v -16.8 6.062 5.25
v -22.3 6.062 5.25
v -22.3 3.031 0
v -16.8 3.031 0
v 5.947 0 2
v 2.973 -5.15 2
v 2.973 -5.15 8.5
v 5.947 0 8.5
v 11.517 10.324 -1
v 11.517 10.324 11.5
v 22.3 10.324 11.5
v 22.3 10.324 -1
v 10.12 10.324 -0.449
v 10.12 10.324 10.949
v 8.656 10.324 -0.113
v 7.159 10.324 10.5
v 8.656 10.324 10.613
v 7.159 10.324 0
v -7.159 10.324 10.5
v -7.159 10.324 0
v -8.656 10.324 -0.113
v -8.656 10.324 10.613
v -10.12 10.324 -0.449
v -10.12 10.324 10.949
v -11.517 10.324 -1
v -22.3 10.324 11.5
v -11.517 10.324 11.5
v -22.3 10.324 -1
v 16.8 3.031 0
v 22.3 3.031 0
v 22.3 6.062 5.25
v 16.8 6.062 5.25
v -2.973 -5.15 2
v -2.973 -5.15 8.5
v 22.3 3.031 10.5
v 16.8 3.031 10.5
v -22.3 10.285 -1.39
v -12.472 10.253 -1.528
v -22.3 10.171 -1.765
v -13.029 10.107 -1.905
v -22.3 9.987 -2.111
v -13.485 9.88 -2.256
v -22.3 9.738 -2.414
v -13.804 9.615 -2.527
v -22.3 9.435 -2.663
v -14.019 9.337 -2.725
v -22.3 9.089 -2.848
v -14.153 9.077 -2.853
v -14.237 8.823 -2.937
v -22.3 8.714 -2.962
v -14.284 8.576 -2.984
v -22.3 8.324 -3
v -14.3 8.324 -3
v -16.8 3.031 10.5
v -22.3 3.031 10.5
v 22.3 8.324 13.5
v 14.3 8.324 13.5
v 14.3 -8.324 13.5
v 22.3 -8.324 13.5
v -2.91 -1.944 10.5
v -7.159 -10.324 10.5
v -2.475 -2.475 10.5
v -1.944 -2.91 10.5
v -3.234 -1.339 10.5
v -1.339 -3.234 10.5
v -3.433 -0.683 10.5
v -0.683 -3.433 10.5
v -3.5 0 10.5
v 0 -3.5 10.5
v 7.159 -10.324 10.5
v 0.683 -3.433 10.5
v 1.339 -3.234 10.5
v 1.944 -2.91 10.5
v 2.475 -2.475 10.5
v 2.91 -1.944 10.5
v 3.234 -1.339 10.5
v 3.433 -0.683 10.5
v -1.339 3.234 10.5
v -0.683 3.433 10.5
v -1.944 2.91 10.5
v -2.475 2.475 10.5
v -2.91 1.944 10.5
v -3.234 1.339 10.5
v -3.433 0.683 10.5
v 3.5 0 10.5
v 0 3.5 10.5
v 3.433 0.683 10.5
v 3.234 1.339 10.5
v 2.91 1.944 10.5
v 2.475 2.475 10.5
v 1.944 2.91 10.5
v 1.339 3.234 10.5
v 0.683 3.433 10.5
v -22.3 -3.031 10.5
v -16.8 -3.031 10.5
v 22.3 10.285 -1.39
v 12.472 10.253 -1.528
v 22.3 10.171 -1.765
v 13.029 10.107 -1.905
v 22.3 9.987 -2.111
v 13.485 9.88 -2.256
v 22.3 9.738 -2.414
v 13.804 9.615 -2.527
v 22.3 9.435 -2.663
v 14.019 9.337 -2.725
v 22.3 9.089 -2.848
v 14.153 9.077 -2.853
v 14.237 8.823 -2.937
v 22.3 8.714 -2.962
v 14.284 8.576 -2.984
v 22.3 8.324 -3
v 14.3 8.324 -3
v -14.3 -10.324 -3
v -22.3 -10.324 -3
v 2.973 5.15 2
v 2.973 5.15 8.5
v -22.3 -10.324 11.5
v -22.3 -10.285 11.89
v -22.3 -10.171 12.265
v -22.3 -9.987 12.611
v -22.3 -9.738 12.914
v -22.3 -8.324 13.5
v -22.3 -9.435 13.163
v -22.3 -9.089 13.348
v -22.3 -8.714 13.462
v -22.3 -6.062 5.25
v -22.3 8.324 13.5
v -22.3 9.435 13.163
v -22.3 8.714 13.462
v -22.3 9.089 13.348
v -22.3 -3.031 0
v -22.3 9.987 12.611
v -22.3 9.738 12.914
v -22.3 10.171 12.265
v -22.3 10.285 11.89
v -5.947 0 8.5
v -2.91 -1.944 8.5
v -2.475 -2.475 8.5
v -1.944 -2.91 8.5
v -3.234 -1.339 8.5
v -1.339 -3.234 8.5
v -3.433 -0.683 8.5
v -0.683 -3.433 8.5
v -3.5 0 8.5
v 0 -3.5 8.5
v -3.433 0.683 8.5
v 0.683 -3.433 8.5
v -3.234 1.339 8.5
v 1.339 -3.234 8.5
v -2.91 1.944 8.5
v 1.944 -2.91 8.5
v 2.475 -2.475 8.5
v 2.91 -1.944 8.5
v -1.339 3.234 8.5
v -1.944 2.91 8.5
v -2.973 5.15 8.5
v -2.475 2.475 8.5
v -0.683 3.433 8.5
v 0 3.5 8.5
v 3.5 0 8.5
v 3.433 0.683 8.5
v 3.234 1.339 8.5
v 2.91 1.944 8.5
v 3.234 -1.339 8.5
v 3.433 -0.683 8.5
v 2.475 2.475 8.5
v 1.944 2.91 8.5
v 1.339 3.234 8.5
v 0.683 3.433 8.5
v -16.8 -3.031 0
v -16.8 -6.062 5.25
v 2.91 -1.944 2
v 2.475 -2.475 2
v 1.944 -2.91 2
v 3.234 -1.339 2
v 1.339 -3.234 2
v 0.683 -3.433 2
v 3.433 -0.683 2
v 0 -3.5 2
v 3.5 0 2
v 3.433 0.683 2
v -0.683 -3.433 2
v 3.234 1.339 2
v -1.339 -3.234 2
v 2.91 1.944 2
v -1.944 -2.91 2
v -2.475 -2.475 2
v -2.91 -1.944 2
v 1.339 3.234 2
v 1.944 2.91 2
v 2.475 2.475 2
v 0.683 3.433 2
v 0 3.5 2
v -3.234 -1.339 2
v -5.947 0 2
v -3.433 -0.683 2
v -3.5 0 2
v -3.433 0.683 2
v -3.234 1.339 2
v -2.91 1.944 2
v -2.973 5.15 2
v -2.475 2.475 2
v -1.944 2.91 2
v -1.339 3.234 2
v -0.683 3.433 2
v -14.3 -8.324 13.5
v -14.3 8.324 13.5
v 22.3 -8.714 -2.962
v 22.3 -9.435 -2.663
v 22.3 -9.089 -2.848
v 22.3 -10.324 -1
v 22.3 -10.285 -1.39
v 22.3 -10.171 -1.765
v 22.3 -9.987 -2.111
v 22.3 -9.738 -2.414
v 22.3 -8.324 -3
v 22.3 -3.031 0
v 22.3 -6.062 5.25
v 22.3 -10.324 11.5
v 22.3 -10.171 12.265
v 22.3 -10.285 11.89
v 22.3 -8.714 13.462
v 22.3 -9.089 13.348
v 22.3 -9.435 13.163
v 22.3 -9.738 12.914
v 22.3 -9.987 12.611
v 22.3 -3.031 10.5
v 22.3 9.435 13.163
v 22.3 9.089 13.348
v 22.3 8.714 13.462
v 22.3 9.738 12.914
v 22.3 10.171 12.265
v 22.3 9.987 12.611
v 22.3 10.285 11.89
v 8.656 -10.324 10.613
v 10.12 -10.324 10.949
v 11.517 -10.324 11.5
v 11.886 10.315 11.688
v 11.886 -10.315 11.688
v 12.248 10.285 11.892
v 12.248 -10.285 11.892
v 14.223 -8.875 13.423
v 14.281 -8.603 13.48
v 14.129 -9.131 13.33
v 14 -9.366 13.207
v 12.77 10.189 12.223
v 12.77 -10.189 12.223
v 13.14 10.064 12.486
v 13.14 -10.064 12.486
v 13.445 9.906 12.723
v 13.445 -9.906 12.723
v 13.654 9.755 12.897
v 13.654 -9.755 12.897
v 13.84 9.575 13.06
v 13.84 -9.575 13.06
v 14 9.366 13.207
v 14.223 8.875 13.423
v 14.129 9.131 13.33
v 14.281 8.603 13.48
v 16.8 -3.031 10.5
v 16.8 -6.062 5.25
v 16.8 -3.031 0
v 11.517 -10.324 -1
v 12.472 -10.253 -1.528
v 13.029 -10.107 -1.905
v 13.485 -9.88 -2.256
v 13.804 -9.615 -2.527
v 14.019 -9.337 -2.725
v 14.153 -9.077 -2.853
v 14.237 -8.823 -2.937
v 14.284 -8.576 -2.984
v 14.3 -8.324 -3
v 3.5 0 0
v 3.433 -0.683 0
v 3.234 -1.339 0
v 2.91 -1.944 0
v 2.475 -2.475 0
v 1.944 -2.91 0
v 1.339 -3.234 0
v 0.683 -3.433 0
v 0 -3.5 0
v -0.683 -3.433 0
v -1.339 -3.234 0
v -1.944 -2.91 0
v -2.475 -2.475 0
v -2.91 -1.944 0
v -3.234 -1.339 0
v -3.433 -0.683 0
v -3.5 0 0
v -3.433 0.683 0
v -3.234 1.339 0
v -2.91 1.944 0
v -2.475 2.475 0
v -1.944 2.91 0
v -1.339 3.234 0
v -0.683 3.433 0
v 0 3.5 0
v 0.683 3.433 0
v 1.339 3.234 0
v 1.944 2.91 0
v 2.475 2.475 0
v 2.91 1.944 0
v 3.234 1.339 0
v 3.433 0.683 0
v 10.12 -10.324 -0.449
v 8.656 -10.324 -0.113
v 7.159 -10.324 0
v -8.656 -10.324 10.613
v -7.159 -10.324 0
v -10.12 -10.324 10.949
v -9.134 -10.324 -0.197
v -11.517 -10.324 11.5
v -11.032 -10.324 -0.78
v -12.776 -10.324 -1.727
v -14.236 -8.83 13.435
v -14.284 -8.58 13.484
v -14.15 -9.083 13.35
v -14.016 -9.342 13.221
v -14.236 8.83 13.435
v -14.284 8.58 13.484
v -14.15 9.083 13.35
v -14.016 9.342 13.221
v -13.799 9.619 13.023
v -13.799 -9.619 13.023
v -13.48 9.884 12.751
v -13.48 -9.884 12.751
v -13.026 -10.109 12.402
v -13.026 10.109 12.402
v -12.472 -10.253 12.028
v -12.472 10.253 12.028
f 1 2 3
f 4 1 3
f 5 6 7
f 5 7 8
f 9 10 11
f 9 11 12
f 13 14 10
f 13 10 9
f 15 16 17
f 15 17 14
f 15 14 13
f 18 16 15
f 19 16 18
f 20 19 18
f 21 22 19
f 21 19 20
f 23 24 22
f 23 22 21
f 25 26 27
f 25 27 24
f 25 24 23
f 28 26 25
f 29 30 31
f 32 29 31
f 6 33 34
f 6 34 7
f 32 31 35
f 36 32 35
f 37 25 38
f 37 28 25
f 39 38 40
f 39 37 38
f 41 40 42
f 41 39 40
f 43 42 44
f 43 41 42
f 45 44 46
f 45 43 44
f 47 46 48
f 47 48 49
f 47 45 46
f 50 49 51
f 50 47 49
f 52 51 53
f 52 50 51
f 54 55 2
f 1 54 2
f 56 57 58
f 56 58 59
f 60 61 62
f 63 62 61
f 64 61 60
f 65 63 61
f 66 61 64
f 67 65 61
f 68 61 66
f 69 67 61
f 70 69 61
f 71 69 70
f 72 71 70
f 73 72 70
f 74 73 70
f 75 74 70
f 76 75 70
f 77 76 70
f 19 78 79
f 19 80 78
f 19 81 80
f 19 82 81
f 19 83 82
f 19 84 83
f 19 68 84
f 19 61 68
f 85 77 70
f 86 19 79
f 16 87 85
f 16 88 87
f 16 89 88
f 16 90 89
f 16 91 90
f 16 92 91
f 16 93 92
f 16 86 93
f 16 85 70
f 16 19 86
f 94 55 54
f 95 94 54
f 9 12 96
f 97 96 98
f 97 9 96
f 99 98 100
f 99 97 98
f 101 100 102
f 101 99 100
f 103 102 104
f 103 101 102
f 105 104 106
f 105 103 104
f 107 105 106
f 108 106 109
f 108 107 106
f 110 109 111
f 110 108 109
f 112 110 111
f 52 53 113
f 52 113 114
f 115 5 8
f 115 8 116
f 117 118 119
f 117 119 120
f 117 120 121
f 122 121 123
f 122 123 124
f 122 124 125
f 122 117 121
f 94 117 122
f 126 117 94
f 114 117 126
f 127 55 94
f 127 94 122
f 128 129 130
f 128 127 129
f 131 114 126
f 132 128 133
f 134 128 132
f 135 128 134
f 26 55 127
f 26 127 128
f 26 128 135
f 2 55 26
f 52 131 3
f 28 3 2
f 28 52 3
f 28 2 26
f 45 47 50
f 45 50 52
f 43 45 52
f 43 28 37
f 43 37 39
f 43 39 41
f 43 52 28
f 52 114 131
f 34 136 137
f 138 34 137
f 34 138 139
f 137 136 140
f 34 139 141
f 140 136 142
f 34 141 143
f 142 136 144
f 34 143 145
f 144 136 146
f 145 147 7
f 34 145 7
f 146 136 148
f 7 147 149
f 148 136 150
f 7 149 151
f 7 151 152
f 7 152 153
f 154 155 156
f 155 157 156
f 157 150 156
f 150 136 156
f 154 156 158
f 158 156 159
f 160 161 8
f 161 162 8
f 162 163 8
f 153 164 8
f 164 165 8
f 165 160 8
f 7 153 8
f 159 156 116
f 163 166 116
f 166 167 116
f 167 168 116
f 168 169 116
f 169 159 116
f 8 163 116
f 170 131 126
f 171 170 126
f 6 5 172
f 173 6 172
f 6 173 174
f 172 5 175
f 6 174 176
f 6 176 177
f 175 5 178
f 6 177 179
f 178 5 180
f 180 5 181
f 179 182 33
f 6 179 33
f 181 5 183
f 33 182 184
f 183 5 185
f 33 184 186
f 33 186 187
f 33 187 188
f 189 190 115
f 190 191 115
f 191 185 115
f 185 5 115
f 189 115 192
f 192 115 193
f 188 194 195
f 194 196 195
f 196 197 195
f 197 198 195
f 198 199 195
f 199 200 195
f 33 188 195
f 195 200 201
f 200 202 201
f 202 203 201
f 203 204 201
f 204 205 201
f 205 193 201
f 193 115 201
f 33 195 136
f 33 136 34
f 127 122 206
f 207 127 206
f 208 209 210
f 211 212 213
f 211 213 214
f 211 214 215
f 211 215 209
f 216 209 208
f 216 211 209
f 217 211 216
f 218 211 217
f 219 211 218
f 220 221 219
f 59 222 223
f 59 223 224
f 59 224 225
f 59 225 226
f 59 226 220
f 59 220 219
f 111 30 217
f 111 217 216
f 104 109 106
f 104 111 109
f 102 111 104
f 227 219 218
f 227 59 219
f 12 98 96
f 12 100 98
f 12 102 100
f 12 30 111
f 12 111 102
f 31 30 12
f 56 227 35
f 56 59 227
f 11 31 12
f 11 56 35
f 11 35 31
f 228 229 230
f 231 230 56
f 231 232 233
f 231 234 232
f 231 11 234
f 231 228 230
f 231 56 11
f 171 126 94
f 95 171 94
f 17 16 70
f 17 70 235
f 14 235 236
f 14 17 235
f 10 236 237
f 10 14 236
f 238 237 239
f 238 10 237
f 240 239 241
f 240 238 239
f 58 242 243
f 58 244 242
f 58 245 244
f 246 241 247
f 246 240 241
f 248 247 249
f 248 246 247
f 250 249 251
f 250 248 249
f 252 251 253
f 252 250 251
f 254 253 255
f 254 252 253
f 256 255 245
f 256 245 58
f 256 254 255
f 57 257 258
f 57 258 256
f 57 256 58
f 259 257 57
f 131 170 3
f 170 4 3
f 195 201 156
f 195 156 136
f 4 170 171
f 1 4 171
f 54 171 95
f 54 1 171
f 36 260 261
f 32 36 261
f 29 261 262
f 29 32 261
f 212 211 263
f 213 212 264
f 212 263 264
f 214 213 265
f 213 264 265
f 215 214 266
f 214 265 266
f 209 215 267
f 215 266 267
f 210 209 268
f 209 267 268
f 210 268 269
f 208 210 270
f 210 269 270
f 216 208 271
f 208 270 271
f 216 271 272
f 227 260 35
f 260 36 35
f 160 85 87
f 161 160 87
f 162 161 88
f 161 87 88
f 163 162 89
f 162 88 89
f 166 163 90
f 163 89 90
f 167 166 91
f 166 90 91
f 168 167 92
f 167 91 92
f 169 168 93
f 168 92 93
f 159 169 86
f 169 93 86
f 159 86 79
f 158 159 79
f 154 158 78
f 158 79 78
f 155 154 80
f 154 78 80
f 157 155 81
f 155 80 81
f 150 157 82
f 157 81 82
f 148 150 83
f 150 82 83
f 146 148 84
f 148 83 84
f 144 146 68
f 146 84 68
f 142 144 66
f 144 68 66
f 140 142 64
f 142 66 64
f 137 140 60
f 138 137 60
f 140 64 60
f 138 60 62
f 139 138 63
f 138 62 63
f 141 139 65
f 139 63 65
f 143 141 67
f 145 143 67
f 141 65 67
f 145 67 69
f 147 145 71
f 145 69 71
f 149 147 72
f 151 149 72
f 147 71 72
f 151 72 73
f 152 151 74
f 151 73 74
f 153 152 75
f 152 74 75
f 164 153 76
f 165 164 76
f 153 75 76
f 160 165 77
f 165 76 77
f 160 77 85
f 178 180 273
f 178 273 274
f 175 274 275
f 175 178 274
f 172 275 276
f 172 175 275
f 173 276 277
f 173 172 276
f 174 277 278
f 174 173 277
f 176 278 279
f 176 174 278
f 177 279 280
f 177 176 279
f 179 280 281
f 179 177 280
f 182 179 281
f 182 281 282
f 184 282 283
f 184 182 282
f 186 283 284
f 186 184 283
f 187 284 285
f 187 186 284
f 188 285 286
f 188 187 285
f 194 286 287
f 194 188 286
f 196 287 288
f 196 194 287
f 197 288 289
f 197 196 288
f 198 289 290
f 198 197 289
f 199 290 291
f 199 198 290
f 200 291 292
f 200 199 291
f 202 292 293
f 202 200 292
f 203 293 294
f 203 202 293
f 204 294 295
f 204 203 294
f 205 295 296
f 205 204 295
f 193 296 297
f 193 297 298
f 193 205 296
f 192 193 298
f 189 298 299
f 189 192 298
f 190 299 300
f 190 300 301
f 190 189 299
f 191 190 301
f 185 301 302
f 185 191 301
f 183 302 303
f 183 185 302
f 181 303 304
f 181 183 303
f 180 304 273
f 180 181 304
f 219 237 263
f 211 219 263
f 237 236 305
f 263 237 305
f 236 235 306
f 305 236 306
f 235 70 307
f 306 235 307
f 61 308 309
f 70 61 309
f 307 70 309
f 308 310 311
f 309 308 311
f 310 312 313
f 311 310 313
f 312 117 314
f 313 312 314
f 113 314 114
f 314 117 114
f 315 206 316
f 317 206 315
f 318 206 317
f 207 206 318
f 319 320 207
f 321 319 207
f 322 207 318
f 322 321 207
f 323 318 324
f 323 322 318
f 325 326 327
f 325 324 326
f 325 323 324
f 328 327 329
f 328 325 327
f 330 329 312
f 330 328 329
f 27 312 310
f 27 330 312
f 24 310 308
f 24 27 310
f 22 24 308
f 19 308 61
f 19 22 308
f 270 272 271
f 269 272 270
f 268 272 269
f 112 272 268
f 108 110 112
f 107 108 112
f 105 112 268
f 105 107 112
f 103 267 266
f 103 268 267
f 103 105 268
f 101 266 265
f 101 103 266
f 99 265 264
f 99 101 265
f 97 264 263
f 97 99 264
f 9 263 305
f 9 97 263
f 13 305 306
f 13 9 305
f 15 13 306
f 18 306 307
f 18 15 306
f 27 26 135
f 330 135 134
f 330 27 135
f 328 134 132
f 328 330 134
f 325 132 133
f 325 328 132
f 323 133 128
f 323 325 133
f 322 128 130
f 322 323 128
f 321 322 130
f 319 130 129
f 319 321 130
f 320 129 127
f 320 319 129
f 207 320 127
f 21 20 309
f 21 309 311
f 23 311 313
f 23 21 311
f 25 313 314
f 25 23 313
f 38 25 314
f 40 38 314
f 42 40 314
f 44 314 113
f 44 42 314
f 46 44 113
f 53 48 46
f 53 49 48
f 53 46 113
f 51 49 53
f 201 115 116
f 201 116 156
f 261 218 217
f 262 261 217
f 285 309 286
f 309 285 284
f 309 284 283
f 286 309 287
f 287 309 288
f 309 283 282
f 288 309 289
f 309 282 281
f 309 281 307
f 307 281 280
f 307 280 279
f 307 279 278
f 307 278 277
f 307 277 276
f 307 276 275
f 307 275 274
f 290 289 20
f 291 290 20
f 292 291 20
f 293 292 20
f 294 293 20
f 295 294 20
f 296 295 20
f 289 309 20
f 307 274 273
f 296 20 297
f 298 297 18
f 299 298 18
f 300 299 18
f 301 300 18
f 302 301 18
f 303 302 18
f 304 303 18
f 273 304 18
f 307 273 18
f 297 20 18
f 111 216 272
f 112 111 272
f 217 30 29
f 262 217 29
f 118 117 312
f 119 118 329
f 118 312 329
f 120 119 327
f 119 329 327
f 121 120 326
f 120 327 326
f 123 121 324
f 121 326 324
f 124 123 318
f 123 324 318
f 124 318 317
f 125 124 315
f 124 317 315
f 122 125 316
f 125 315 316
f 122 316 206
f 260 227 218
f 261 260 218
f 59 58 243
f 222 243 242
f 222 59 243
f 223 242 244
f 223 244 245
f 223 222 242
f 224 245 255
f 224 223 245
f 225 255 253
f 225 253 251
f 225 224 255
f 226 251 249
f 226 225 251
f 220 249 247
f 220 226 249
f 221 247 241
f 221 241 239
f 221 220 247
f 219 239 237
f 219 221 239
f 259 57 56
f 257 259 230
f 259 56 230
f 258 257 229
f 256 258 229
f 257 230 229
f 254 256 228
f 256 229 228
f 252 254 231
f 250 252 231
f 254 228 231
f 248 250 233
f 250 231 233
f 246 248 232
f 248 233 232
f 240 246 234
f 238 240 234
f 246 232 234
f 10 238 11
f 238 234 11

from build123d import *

# Parameters (mm, degrees)
CROQUIS1_W              = 44.6
CROQUIS1_H              = 20.647373716
SALIENTE_EXTRUIR2_DEPTH = 10.5
CROQUIS2_R              = 7.366343287
CROQUIS2_R_2            = 3.5
SALIENTE_EXTRUIR3_DEPTH = 2
SALIENTE_EXTRUIR4_START = -2
CROQUIS3_R              = 6.292932571
CROQUIS3_R_2            = 3.5
SALIENTE_EXTRUIR4_DEPTH = 2
CORTAR_EXTRUIR1_DEPTH   = 5.5
CORTAR_EXTRUIR2_DEPTH   = 5.5
CROQUIS6_W              = 8
CROQUIS6_H              = 20.647373716
SALIENTE_EXTRUIR5_DEPTH = 3
CROQUIS7_W              = 8
CROQUIS7_H              = 20.647373716
SALIENTE_EXTRUIR6_DEPTH = 3
REDONDEO1_R             = 10
REDONDEO2_R             = 2


with BuildPart() as part:
    # Croquis1 → Saliente-Extruir2 (new body)
    with BuildSketch(Plane.XY):
        Rectangle(CROQUIS1_W, CROQUIS1_H)
        Polygon((5.946707773, 0), (2.973353886, 5.15), (-2.973353886, 5.15), (-5.946707773, 0), (-2.973353886, -5.15), (2.973353886, -5.15), align=None, mode=Mode.SUBTRACT)
    extrude(amount=SALIENTE_EXTRUIR2_DEPTH)

    # Croquis2 → Saliente-Extruir3 (add)
    with BuildSketch(Plane.XY.offset(10.5)):
        Circle(CROQUIS2_R)
        Circle(CROQUIS2_R_2, mode=Mode.SUBTRACT)
    extrude(amount=-SALIENTE_EXTRUIR3_DEPTH)

    # Croquis3 → Saliente-Extruir4 (add)
    with BuildSketch(Plane(origin=(0, 0, 0), x_dir=(-1, 0, 0), z_dir=(0, 0, -1)).offset(SALIENTE_EXTRUIR4_START)):
        Circle(CROQUIS3_R)
        with Locations(Location((0, 0, 0), (0, 0, 180))):
            Circle(CROQUIS3_R_2, mode=Mode.SUBTRACT)
    extrude(amount=SALIENTE_EXTRUIR4_DEPTH)

    # Croquis4 → Cortar-Extruir1 (cut)
    with BuildSketch(Plane(origin=(22.3, 0, 0), x_dir=(0, 0, -1), z_dir=(1, 0, 0))):
        Polygon((-5.25, 6.062177826), (-10.5, 3.031088913), (-10.5, -3.031088913), (-5.25, -6.062177826), (0, -3.031088913), (0, 3.031088913), align=None)
    extrude(amount=-CORTAR_EXTRUIR1_DEPTH, mode=Mode.SUBTRACT)

    # Croquis5 → Cortar-Extruir2 (cut)
    with BuildSketch(Plane.ZY.offset(22.3)):
        Polygon((5.25, 6.062177826), (0, 3.031088913), (0, -3.031088913), (5.25, -6.062177826), (10.5, -3.031088913), (10.5, 3.031088913), align=None)
    extrude(amount=-CORTAR_EXTRUIR2_DEPTH, mode=Mode.SUBTRACT)

    # Croquis6 → Saliente-Extruir5 (add)
    with BuildSketch(Plane(origin=(0, 0, 0), x_dir=(-1, 0, 0), z_dir=(0, 0, -1))):
        with Locations((-18.3, 0)):
            Rectangle(CROQUIS6_W, CROQUIS6_H)
        with Locations((18.3, 0)):
            Rectangle(CROQUIS6_W, CROQUIS6_H)
    extrude(amount=SALIENTE_EXTRUIR5_DEPTH)

    # Croquis7 → Saliente-Extruir6 (add)
    with BuildSketch(Plane.XY.offset(10.5)):
        with Locations((-18.3, 0)):
            Rectangle(CROQUIS7_W, CROQUIS7_H)
        with Locations((18.3, 0)):
            Rectangle(CROQUIS7_W, CROQUIS7_H)
    extrude(amount=SALIENTE_EXTRUIR6_DEPTH)

    # Redondeo1
    # the kernel refuses this fillet: 10 mm, written as the material it adds along each edge
    with BuildSketch(Plane(origin=(-14.3, 10.323686858, 10.5), x_dir=(1, 0, 0), z_dir=(0, -1, 0)), Plane(origin=(14.3, 10.323686858, 0), x_dir=(-1, 0, 0), z_dir=(0, -1, 0))) as redondeo1_piece_1:
        with BuildLine():
            CenterArc((7.141428429, 10), REDONDEO1_R, 224.427004001, 45.572995999)
            Line((0, 3), (-0.142828569, 2.86))
            ThreePointArc((-0.142828569, 2.86), (-0.2, 1.5), (-0.2, 0))
            Line((-0.2, 0), (0, -0.2))
            Line((0, -0.2), (7.141428429, -0.2))
            Line((7.141428429, -0.2), (7.141428429, 0))
        make_face()
    extrude(amount=20.647373716)
    with BuildSketch(Plane(origin=(14.3, 10.323686858, 10.5), x_dir=(0, 0, 1), z_dir=(0, -1, 0)), Plane(origin=(-14.3, 10.323686858, 0), x_dir=(0, 0, -1), z_dir=(0, -1, 0))) as redondeo1_piece_2:
        with BuildLine():
            CenterArc((10, 7.141428429), REDONDEO1_R, 180, 45.572995999)
            Line((0, 7.141428429), (-0.2, 7.141428429))
            Line((-0.2, 7.141428429), (-0.2, 0))
            Line((-0.2, 0), (0, -0.2))
            ThreePointArc((0, -0.2), (1.5, -0.2), (2.86, -0.142828569))
            Line((2.86, -0.142828569), (3, 0))
        make_face()
    extrude(amount=20.647373716)

    # Redondeo2
    redondeo2_edges = [part.edges().sort_by_distance(p)[0] for p in [
        (18.3, -10.323686858, -3),
        (18.3, 10.323686858, -3),
        (-18.3, 10.323686858, -3),
        (-18.3, -10.323686858, 13.5),
        (-18.3, 10.323686858, 13.5),
        (18.3, 10.323686858, 13.5),
        (18.3, -10.323686858, 13.5),
    ]]
    fillet(redondeo2_edges, radius=REDONDEO2_R)


solid = part.part
